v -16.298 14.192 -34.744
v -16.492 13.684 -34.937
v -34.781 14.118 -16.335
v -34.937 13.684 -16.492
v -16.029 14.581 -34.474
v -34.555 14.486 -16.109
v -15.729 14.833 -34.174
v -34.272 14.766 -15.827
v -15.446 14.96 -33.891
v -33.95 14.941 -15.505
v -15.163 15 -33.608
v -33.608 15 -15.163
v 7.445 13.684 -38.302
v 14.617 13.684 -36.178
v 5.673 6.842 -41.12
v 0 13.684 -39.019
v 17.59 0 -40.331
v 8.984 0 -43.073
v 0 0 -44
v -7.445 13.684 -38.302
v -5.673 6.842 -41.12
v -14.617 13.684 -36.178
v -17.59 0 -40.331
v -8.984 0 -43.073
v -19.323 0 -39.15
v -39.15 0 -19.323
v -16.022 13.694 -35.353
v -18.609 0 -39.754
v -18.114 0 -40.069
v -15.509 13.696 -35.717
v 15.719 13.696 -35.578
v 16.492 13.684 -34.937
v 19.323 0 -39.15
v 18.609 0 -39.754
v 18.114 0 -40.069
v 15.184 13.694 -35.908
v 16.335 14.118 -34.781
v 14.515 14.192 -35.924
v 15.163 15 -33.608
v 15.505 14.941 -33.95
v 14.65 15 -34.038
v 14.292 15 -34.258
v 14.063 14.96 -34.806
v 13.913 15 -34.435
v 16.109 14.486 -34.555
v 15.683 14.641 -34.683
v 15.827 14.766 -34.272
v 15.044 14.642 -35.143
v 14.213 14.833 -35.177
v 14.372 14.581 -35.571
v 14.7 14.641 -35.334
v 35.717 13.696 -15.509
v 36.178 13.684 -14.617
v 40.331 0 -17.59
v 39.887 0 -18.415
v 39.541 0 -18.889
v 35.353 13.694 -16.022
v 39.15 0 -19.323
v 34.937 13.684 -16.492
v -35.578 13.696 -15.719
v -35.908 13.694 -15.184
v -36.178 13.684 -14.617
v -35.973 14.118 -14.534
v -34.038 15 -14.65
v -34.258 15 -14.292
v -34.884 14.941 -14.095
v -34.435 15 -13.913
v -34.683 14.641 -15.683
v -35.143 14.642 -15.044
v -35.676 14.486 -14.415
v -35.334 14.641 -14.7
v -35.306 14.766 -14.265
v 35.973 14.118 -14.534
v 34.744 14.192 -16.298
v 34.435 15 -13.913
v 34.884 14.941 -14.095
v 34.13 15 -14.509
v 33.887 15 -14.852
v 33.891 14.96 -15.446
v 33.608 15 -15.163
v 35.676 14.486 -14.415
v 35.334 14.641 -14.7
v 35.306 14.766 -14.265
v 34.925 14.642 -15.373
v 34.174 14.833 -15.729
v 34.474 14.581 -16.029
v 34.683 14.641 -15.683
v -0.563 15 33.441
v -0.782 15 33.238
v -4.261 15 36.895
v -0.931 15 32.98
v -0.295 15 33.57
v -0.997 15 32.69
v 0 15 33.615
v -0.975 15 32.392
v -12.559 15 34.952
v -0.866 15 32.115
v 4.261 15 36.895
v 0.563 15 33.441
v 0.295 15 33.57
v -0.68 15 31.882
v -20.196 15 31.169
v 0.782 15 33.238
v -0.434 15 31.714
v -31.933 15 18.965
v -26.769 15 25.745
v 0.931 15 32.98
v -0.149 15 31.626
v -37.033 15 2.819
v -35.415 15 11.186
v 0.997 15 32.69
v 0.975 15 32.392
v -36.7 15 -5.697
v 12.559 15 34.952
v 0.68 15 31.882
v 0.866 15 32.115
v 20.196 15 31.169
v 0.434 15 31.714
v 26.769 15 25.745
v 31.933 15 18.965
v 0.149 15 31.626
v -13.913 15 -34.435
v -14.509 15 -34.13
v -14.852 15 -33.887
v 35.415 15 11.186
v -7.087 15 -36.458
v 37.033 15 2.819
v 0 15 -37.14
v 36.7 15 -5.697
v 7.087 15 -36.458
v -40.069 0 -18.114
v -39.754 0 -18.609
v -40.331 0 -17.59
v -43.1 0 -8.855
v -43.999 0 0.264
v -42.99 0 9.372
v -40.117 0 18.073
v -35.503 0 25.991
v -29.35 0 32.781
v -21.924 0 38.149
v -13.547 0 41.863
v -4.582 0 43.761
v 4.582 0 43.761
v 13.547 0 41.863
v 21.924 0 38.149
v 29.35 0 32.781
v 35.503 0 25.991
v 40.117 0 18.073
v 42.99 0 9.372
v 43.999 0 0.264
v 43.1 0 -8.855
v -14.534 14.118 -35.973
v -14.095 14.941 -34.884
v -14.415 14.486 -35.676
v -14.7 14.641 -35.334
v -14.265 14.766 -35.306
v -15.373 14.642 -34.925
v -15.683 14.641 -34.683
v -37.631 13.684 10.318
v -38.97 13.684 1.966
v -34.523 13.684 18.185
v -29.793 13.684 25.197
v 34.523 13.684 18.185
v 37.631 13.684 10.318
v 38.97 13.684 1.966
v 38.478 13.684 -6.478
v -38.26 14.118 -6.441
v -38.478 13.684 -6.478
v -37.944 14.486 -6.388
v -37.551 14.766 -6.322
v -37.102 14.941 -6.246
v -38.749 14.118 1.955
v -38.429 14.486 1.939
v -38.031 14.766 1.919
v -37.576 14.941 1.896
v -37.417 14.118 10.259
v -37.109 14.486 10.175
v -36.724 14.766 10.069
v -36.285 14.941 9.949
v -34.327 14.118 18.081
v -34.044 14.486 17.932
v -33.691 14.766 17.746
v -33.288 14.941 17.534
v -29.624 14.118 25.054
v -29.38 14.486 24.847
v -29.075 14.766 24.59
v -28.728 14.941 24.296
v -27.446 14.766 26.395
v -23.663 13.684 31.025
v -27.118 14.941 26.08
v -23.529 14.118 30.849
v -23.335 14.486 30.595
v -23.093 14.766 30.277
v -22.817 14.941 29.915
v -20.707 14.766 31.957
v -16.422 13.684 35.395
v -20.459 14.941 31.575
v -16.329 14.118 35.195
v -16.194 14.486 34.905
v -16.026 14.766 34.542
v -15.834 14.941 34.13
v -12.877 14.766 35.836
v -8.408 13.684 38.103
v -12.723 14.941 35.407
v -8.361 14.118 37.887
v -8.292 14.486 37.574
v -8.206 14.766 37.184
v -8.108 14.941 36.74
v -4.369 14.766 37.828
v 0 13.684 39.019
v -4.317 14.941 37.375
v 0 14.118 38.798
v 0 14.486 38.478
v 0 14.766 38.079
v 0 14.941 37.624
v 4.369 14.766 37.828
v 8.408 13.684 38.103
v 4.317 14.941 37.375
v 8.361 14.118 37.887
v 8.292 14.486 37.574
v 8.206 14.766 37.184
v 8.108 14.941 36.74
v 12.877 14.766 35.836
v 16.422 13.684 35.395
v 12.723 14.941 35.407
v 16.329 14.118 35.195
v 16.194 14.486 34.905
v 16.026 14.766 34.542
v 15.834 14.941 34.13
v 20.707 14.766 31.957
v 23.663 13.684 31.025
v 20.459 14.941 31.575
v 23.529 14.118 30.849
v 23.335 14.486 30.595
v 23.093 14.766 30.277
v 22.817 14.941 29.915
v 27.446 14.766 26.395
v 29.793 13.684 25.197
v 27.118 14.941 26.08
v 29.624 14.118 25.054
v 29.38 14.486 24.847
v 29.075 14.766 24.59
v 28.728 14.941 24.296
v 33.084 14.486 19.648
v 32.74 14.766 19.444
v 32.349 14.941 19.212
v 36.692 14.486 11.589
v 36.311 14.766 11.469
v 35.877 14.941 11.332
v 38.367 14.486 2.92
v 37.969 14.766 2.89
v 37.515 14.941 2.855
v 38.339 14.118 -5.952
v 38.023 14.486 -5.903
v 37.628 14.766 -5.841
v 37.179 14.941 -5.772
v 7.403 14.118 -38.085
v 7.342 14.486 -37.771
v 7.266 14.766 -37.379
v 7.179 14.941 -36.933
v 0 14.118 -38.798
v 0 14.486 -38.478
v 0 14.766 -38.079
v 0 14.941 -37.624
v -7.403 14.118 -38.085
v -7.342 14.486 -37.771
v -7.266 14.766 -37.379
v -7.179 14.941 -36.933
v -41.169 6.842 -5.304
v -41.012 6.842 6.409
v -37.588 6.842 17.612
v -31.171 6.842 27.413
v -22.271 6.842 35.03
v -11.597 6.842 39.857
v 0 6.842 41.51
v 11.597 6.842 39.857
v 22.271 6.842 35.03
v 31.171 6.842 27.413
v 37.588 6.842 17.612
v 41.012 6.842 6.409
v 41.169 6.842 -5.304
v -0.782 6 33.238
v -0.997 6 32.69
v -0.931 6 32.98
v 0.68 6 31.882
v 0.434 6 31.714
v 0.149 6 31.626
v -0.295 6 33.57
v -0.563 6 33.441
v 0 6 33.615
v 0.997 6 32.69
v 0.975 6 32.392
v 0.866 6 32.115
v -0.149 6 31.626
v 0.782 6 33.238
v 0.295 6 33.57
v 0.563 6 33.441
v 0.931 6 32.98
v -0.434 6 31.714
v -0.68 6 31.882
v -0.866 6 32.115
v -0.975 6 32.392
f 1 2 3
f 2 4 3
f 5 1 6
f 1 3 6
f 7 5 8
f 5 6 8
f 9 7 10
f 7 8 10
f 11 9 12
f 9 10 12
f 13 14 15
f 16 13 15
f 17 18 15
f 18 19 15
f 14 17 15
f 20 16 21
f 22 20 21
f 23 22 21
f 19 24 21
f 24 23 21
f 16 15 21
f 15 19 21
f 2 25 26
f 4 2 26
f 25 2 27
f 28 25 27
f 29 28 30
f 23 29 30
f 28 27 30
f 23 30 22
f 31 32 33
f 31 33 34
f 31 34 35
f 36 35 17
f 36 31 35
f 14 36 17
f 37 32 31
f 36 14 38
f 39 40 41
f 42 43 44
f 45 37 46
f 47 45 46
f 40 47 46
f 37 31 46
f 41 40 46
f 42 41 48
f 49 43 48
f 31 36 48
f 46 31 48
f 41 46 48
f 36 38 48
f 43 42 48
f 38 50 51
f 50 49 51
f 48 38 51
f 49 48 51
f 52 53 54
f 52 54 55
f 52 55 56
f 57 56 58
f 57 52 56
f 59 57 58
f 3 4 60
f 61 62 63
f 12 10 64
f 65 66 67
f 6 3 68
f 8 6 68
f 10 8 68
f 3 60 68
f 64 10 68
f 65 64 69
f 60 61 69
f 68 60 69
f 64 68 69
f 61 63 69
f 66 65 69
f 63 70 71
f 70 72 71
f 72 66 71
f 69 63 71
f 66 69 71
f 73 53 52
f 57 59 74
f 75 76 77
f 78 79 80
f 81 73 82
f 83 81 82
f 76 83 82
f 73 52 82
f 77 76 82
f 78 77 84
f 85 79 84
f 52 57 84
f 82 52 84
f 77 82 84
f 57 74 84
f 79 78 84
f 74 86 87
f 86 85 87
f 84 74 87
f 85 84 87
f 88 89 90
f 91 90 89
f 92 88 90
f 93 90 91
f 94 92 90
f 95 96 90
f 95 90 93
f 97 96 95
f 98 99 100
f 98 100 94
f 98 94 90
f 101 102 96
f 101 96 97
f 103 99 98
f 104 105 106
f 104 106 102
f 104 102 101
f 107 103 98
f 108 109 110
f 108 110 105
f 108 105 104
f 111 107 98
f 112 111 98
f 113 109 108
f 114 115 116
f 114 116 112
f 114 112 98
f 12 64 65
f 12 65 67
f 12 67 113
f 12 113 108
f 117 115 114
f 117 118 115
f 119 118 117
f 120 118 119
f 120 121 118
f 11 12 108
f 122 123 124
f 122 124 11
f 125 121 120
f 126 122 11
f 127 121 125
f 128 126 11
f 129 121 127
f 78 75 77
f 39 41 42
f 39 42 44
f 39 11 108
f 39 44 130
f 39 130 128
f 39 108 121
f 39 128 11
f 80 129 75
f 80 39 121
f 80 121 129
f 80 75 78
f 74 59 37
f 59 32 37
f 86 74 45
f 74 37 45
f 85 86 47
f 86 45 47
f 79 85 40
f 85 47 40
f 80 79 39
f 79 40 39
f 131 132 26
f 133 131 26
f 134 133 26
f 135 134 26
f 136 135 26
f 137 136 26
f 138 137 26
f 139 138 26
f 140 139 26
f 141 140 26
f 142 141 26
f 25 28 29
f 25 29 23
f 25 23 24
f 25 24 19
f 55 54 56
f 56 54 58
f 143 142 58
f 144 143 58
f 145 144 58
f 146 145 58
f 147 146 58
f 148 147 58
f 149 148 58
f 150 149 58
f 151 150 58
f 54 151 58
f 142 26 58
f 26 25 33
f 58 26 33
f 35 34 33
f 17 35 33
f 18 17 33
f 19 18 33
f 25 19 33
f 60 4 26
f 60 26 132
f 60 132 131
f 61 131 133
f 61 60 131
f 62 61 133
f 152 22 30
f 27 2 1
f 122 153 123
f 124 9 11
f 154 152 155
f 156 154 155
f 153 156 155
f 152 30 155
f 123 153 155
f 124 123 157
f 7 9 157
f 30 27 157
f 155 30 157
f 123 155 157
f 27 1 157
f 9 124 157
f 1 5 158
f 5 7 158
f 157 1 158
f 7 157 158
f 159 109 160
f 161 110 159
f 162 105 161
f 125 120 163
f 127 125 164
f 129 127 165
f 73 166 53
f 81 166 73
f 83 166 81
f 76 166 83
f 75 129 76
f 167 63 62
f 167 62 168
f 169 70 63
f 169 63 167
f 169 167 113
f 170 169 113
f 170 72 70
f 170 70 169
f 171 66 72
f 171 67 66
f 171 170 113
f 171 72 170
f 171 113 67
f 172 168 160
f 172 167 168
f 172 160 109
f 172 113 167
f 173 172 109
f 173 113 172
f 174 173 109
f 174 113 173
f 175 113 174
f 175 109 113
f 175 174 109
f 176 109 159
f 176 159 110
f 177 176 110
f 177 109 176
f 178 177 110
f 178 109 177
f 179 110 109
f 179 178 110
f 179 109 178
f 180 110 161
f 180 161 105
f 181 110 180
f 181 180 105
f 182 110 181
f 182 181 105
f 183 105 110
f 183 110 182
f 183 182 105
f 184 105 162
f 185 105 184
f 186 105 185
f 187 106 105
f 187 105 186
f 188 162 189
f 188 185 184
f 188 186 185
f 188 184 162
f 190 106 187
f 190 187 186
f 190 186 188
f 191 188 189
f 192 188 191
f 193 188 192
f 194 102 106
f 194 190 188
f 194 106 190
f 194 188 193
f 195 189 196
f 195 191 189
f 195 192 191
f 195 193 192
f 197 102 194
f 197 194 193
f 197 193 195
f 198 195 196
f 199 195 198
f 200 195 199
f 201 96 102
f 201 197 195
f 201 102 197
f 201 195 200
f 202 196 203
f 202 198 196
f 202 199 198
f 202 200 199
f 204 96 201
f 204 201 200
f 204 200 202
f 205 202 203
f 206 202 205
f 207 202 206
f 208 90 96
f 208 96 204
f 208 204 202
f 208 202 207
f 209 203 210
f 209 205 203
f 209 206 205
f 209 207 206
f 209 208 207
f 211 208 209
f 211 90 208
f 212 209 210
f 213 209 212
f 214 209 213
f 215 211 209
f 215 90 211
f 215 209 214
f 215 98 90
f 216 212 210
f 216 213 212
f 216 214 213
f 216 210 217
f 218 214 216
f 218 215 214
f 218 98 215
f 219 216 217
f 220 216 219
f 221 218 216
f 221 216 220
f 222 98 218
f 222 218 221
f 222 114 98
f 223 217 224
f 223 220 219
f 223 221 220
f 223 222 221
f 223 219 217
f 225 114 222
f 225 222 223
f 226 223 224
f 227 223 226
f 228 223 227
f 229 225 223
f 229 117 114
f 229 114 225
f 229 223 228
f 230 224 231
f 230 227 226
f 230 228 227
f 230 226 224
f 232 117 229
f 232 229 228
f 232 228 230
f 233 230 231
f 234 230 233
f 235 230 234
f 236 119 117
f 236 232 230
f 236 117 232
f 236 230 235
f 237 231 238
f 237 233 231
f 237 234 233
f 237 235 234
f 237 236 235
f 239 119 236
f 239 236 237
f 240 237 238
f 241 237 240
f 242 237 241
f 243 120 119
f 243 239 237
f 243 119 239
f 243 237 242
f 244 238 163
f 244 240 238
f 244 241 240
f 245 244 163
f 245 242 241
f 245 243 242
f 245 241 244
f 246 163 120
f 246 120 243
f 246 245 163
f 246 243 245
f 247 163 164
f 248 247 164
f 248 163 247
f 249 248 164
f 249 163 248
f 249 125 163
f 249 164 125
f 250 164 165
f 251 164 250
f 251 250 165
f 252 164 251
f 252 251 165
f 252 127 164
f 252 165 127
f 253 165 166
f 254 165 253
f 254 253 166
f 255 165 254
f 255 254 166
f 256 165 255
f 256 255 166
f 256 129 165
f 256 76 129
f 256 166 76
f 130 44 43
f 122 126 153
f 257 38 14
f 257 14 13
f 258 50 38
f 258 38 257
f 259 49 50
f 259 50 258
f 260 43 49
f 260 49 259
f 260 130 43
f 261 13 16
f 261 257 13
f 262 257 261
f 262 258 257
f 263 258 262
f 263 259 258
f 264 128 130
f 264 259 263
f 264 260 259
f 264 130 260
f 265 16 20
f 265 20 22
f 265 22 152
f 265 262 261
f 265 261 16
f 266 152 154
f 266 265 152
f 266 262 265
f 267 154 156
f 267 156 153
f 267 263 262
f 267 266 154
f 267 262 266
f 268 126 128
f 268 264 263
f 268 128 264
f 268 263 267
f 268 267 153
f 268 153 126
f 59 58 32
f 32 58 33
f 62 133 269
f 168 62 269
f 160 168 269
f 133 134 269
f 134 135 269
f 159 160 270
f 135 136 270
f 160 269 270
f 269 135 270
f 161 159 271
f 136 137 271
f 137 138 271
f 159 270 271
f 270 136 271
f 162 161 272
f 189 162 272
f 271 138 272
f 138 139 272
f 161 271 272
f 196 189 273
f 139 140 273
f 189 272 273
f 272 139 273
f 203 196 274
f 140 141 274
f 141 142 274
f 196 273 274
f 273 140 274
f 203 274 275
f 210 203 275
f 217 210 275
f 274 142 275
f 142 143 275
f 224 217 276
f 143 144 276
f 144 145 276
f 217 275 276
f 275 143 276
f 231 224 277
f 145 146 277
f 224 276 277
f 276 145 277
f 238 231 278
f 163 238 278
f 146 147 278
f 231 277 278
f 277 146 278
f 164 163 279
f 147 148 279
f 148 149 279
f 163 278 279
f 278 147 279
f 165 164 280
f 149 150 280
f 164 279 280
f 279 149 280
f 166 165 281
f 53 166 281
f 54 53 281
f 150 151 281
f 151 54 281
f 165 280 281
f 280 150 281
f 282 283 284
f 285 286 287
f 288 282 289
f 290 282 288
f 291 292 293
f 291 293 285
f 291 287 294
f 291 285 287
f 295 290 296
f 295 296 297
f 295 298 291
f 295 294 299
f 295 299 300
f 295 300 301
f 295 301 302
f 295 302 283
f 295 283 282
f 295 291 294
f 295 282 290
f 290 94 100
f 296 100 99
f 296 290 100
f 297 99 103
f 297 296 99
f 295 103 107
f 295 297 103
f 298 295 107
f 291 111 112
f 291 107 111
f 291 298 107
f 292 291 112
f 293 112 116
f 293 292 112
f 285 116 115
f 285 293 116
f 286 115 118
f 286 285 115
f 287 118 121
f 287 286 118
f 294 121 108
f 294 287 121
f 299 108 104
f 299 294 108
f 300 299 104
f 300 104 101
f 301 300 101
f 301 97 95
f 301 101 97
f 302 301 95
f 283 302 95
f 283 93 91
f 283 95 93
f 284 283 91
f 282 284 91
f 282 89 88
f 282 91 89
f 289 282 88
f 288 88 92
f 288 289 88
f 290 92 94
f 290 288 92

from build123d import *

# Parameters (mm, degrees)
EXTRUDE_1_DEPTH     = 15
DRAFT_2_ANGLE       = -20
FILLET_1_R          = 6
FILLET_2_R          = 2
CUT_EXTRUDE_START   = 6
SKETCH_2_R          = 1
CUT_EXTRUDE_1_DEPTH = 59.007812184


with BuildPart() as part:
    # 草图1 → 凸台-拉伸1 (new body)
    with BuildSketch(Plane(origin=(0, 0, 0), x_dir=(1, 0, 0), z_dir=(0, 1, 0))):
        with BuildLine():
            Line((-18.595203517, 39.87754263), (-39.87754263, 18.595203517))
            ThreePointArc((-39.87754263, 18.595203517), (0, -44), (39.87754263, 18.595203517))
            Line((39.87754263, 18.595203517), (18.595203517, 39.87754263))
            ThreePointArc((18.595203517, 39.87754263), (0, 44), (-18.595203517, 39.87754263))
        make_face()
    extrude(amount=EXTRUDE_1_DEPTH)

    # 拔模2
    draft_2_faces = [part.faces().sort_by_distance(p)[0] for p in [
        (29.236373073, 7.5, -29.236373073),
        (0, 7.5, 44),
        (-29.236373073, 7.5, -29.236373073),
        (0, 7.5, -44),
    ]]
    draft(draft_2_faces, Plane(origin=(0, 0, 0), x_dir=(0, 0, -1), z_dir=(0, -1, 0)), DRAFT_2_ANGLE)

    # 圆角1
    fillet_1_edges = [part.edges().sort_by_distance(p)[0] for p in [
        (17.010833705, 7.500497123, -37.601169244),
        (37.601169244, 7.500497123, -17.010833705),
        (-37.601169244, 7.500497123, -17.010833705),
        (-17.010833705, 7.500497123, -37.601169244),
    ]]
    fillet(fillet_1_edges, radius=FILLET_1_R)

    # 圆角2
    fillet_2_edges = [part.edges().sort_by_distance(p)[0] for p in [
        (-35.248872303, 15, -15.340682868),
        (-25.375885761, 15, -25.375885761),
        (-15.340682868, 15, -35.248872303),
        (0, 15, -38.540446486),
        (15.340682868, 15, -35.248872303),
        (25.375885761, 15, -25.375885761),
        (35.248872303, 15, -15.340682868),
        (0, 15, 38.540446486),
    ]]
    fillet(fillet_2_edges, radius=FILLET_2_R)

    # 草图2 → 切除-拉伸1 (cut, through all)
    with BuildSketch(Plane(origin=(0, 0, 0), x_dir=(1, 0, 0), z_dir=(0, 1, 0)).offset(CUT_EXTRUDE_START)):
        with Locations(Location((0, -32.614789591, 0), (0, 0, 270))):
            Circle(SKETCH_2_R)
    extrude(amount=CUT_EXTRUDE_1_DEPTH, mode=Mode.SUBTRACT)


solid = part.part
